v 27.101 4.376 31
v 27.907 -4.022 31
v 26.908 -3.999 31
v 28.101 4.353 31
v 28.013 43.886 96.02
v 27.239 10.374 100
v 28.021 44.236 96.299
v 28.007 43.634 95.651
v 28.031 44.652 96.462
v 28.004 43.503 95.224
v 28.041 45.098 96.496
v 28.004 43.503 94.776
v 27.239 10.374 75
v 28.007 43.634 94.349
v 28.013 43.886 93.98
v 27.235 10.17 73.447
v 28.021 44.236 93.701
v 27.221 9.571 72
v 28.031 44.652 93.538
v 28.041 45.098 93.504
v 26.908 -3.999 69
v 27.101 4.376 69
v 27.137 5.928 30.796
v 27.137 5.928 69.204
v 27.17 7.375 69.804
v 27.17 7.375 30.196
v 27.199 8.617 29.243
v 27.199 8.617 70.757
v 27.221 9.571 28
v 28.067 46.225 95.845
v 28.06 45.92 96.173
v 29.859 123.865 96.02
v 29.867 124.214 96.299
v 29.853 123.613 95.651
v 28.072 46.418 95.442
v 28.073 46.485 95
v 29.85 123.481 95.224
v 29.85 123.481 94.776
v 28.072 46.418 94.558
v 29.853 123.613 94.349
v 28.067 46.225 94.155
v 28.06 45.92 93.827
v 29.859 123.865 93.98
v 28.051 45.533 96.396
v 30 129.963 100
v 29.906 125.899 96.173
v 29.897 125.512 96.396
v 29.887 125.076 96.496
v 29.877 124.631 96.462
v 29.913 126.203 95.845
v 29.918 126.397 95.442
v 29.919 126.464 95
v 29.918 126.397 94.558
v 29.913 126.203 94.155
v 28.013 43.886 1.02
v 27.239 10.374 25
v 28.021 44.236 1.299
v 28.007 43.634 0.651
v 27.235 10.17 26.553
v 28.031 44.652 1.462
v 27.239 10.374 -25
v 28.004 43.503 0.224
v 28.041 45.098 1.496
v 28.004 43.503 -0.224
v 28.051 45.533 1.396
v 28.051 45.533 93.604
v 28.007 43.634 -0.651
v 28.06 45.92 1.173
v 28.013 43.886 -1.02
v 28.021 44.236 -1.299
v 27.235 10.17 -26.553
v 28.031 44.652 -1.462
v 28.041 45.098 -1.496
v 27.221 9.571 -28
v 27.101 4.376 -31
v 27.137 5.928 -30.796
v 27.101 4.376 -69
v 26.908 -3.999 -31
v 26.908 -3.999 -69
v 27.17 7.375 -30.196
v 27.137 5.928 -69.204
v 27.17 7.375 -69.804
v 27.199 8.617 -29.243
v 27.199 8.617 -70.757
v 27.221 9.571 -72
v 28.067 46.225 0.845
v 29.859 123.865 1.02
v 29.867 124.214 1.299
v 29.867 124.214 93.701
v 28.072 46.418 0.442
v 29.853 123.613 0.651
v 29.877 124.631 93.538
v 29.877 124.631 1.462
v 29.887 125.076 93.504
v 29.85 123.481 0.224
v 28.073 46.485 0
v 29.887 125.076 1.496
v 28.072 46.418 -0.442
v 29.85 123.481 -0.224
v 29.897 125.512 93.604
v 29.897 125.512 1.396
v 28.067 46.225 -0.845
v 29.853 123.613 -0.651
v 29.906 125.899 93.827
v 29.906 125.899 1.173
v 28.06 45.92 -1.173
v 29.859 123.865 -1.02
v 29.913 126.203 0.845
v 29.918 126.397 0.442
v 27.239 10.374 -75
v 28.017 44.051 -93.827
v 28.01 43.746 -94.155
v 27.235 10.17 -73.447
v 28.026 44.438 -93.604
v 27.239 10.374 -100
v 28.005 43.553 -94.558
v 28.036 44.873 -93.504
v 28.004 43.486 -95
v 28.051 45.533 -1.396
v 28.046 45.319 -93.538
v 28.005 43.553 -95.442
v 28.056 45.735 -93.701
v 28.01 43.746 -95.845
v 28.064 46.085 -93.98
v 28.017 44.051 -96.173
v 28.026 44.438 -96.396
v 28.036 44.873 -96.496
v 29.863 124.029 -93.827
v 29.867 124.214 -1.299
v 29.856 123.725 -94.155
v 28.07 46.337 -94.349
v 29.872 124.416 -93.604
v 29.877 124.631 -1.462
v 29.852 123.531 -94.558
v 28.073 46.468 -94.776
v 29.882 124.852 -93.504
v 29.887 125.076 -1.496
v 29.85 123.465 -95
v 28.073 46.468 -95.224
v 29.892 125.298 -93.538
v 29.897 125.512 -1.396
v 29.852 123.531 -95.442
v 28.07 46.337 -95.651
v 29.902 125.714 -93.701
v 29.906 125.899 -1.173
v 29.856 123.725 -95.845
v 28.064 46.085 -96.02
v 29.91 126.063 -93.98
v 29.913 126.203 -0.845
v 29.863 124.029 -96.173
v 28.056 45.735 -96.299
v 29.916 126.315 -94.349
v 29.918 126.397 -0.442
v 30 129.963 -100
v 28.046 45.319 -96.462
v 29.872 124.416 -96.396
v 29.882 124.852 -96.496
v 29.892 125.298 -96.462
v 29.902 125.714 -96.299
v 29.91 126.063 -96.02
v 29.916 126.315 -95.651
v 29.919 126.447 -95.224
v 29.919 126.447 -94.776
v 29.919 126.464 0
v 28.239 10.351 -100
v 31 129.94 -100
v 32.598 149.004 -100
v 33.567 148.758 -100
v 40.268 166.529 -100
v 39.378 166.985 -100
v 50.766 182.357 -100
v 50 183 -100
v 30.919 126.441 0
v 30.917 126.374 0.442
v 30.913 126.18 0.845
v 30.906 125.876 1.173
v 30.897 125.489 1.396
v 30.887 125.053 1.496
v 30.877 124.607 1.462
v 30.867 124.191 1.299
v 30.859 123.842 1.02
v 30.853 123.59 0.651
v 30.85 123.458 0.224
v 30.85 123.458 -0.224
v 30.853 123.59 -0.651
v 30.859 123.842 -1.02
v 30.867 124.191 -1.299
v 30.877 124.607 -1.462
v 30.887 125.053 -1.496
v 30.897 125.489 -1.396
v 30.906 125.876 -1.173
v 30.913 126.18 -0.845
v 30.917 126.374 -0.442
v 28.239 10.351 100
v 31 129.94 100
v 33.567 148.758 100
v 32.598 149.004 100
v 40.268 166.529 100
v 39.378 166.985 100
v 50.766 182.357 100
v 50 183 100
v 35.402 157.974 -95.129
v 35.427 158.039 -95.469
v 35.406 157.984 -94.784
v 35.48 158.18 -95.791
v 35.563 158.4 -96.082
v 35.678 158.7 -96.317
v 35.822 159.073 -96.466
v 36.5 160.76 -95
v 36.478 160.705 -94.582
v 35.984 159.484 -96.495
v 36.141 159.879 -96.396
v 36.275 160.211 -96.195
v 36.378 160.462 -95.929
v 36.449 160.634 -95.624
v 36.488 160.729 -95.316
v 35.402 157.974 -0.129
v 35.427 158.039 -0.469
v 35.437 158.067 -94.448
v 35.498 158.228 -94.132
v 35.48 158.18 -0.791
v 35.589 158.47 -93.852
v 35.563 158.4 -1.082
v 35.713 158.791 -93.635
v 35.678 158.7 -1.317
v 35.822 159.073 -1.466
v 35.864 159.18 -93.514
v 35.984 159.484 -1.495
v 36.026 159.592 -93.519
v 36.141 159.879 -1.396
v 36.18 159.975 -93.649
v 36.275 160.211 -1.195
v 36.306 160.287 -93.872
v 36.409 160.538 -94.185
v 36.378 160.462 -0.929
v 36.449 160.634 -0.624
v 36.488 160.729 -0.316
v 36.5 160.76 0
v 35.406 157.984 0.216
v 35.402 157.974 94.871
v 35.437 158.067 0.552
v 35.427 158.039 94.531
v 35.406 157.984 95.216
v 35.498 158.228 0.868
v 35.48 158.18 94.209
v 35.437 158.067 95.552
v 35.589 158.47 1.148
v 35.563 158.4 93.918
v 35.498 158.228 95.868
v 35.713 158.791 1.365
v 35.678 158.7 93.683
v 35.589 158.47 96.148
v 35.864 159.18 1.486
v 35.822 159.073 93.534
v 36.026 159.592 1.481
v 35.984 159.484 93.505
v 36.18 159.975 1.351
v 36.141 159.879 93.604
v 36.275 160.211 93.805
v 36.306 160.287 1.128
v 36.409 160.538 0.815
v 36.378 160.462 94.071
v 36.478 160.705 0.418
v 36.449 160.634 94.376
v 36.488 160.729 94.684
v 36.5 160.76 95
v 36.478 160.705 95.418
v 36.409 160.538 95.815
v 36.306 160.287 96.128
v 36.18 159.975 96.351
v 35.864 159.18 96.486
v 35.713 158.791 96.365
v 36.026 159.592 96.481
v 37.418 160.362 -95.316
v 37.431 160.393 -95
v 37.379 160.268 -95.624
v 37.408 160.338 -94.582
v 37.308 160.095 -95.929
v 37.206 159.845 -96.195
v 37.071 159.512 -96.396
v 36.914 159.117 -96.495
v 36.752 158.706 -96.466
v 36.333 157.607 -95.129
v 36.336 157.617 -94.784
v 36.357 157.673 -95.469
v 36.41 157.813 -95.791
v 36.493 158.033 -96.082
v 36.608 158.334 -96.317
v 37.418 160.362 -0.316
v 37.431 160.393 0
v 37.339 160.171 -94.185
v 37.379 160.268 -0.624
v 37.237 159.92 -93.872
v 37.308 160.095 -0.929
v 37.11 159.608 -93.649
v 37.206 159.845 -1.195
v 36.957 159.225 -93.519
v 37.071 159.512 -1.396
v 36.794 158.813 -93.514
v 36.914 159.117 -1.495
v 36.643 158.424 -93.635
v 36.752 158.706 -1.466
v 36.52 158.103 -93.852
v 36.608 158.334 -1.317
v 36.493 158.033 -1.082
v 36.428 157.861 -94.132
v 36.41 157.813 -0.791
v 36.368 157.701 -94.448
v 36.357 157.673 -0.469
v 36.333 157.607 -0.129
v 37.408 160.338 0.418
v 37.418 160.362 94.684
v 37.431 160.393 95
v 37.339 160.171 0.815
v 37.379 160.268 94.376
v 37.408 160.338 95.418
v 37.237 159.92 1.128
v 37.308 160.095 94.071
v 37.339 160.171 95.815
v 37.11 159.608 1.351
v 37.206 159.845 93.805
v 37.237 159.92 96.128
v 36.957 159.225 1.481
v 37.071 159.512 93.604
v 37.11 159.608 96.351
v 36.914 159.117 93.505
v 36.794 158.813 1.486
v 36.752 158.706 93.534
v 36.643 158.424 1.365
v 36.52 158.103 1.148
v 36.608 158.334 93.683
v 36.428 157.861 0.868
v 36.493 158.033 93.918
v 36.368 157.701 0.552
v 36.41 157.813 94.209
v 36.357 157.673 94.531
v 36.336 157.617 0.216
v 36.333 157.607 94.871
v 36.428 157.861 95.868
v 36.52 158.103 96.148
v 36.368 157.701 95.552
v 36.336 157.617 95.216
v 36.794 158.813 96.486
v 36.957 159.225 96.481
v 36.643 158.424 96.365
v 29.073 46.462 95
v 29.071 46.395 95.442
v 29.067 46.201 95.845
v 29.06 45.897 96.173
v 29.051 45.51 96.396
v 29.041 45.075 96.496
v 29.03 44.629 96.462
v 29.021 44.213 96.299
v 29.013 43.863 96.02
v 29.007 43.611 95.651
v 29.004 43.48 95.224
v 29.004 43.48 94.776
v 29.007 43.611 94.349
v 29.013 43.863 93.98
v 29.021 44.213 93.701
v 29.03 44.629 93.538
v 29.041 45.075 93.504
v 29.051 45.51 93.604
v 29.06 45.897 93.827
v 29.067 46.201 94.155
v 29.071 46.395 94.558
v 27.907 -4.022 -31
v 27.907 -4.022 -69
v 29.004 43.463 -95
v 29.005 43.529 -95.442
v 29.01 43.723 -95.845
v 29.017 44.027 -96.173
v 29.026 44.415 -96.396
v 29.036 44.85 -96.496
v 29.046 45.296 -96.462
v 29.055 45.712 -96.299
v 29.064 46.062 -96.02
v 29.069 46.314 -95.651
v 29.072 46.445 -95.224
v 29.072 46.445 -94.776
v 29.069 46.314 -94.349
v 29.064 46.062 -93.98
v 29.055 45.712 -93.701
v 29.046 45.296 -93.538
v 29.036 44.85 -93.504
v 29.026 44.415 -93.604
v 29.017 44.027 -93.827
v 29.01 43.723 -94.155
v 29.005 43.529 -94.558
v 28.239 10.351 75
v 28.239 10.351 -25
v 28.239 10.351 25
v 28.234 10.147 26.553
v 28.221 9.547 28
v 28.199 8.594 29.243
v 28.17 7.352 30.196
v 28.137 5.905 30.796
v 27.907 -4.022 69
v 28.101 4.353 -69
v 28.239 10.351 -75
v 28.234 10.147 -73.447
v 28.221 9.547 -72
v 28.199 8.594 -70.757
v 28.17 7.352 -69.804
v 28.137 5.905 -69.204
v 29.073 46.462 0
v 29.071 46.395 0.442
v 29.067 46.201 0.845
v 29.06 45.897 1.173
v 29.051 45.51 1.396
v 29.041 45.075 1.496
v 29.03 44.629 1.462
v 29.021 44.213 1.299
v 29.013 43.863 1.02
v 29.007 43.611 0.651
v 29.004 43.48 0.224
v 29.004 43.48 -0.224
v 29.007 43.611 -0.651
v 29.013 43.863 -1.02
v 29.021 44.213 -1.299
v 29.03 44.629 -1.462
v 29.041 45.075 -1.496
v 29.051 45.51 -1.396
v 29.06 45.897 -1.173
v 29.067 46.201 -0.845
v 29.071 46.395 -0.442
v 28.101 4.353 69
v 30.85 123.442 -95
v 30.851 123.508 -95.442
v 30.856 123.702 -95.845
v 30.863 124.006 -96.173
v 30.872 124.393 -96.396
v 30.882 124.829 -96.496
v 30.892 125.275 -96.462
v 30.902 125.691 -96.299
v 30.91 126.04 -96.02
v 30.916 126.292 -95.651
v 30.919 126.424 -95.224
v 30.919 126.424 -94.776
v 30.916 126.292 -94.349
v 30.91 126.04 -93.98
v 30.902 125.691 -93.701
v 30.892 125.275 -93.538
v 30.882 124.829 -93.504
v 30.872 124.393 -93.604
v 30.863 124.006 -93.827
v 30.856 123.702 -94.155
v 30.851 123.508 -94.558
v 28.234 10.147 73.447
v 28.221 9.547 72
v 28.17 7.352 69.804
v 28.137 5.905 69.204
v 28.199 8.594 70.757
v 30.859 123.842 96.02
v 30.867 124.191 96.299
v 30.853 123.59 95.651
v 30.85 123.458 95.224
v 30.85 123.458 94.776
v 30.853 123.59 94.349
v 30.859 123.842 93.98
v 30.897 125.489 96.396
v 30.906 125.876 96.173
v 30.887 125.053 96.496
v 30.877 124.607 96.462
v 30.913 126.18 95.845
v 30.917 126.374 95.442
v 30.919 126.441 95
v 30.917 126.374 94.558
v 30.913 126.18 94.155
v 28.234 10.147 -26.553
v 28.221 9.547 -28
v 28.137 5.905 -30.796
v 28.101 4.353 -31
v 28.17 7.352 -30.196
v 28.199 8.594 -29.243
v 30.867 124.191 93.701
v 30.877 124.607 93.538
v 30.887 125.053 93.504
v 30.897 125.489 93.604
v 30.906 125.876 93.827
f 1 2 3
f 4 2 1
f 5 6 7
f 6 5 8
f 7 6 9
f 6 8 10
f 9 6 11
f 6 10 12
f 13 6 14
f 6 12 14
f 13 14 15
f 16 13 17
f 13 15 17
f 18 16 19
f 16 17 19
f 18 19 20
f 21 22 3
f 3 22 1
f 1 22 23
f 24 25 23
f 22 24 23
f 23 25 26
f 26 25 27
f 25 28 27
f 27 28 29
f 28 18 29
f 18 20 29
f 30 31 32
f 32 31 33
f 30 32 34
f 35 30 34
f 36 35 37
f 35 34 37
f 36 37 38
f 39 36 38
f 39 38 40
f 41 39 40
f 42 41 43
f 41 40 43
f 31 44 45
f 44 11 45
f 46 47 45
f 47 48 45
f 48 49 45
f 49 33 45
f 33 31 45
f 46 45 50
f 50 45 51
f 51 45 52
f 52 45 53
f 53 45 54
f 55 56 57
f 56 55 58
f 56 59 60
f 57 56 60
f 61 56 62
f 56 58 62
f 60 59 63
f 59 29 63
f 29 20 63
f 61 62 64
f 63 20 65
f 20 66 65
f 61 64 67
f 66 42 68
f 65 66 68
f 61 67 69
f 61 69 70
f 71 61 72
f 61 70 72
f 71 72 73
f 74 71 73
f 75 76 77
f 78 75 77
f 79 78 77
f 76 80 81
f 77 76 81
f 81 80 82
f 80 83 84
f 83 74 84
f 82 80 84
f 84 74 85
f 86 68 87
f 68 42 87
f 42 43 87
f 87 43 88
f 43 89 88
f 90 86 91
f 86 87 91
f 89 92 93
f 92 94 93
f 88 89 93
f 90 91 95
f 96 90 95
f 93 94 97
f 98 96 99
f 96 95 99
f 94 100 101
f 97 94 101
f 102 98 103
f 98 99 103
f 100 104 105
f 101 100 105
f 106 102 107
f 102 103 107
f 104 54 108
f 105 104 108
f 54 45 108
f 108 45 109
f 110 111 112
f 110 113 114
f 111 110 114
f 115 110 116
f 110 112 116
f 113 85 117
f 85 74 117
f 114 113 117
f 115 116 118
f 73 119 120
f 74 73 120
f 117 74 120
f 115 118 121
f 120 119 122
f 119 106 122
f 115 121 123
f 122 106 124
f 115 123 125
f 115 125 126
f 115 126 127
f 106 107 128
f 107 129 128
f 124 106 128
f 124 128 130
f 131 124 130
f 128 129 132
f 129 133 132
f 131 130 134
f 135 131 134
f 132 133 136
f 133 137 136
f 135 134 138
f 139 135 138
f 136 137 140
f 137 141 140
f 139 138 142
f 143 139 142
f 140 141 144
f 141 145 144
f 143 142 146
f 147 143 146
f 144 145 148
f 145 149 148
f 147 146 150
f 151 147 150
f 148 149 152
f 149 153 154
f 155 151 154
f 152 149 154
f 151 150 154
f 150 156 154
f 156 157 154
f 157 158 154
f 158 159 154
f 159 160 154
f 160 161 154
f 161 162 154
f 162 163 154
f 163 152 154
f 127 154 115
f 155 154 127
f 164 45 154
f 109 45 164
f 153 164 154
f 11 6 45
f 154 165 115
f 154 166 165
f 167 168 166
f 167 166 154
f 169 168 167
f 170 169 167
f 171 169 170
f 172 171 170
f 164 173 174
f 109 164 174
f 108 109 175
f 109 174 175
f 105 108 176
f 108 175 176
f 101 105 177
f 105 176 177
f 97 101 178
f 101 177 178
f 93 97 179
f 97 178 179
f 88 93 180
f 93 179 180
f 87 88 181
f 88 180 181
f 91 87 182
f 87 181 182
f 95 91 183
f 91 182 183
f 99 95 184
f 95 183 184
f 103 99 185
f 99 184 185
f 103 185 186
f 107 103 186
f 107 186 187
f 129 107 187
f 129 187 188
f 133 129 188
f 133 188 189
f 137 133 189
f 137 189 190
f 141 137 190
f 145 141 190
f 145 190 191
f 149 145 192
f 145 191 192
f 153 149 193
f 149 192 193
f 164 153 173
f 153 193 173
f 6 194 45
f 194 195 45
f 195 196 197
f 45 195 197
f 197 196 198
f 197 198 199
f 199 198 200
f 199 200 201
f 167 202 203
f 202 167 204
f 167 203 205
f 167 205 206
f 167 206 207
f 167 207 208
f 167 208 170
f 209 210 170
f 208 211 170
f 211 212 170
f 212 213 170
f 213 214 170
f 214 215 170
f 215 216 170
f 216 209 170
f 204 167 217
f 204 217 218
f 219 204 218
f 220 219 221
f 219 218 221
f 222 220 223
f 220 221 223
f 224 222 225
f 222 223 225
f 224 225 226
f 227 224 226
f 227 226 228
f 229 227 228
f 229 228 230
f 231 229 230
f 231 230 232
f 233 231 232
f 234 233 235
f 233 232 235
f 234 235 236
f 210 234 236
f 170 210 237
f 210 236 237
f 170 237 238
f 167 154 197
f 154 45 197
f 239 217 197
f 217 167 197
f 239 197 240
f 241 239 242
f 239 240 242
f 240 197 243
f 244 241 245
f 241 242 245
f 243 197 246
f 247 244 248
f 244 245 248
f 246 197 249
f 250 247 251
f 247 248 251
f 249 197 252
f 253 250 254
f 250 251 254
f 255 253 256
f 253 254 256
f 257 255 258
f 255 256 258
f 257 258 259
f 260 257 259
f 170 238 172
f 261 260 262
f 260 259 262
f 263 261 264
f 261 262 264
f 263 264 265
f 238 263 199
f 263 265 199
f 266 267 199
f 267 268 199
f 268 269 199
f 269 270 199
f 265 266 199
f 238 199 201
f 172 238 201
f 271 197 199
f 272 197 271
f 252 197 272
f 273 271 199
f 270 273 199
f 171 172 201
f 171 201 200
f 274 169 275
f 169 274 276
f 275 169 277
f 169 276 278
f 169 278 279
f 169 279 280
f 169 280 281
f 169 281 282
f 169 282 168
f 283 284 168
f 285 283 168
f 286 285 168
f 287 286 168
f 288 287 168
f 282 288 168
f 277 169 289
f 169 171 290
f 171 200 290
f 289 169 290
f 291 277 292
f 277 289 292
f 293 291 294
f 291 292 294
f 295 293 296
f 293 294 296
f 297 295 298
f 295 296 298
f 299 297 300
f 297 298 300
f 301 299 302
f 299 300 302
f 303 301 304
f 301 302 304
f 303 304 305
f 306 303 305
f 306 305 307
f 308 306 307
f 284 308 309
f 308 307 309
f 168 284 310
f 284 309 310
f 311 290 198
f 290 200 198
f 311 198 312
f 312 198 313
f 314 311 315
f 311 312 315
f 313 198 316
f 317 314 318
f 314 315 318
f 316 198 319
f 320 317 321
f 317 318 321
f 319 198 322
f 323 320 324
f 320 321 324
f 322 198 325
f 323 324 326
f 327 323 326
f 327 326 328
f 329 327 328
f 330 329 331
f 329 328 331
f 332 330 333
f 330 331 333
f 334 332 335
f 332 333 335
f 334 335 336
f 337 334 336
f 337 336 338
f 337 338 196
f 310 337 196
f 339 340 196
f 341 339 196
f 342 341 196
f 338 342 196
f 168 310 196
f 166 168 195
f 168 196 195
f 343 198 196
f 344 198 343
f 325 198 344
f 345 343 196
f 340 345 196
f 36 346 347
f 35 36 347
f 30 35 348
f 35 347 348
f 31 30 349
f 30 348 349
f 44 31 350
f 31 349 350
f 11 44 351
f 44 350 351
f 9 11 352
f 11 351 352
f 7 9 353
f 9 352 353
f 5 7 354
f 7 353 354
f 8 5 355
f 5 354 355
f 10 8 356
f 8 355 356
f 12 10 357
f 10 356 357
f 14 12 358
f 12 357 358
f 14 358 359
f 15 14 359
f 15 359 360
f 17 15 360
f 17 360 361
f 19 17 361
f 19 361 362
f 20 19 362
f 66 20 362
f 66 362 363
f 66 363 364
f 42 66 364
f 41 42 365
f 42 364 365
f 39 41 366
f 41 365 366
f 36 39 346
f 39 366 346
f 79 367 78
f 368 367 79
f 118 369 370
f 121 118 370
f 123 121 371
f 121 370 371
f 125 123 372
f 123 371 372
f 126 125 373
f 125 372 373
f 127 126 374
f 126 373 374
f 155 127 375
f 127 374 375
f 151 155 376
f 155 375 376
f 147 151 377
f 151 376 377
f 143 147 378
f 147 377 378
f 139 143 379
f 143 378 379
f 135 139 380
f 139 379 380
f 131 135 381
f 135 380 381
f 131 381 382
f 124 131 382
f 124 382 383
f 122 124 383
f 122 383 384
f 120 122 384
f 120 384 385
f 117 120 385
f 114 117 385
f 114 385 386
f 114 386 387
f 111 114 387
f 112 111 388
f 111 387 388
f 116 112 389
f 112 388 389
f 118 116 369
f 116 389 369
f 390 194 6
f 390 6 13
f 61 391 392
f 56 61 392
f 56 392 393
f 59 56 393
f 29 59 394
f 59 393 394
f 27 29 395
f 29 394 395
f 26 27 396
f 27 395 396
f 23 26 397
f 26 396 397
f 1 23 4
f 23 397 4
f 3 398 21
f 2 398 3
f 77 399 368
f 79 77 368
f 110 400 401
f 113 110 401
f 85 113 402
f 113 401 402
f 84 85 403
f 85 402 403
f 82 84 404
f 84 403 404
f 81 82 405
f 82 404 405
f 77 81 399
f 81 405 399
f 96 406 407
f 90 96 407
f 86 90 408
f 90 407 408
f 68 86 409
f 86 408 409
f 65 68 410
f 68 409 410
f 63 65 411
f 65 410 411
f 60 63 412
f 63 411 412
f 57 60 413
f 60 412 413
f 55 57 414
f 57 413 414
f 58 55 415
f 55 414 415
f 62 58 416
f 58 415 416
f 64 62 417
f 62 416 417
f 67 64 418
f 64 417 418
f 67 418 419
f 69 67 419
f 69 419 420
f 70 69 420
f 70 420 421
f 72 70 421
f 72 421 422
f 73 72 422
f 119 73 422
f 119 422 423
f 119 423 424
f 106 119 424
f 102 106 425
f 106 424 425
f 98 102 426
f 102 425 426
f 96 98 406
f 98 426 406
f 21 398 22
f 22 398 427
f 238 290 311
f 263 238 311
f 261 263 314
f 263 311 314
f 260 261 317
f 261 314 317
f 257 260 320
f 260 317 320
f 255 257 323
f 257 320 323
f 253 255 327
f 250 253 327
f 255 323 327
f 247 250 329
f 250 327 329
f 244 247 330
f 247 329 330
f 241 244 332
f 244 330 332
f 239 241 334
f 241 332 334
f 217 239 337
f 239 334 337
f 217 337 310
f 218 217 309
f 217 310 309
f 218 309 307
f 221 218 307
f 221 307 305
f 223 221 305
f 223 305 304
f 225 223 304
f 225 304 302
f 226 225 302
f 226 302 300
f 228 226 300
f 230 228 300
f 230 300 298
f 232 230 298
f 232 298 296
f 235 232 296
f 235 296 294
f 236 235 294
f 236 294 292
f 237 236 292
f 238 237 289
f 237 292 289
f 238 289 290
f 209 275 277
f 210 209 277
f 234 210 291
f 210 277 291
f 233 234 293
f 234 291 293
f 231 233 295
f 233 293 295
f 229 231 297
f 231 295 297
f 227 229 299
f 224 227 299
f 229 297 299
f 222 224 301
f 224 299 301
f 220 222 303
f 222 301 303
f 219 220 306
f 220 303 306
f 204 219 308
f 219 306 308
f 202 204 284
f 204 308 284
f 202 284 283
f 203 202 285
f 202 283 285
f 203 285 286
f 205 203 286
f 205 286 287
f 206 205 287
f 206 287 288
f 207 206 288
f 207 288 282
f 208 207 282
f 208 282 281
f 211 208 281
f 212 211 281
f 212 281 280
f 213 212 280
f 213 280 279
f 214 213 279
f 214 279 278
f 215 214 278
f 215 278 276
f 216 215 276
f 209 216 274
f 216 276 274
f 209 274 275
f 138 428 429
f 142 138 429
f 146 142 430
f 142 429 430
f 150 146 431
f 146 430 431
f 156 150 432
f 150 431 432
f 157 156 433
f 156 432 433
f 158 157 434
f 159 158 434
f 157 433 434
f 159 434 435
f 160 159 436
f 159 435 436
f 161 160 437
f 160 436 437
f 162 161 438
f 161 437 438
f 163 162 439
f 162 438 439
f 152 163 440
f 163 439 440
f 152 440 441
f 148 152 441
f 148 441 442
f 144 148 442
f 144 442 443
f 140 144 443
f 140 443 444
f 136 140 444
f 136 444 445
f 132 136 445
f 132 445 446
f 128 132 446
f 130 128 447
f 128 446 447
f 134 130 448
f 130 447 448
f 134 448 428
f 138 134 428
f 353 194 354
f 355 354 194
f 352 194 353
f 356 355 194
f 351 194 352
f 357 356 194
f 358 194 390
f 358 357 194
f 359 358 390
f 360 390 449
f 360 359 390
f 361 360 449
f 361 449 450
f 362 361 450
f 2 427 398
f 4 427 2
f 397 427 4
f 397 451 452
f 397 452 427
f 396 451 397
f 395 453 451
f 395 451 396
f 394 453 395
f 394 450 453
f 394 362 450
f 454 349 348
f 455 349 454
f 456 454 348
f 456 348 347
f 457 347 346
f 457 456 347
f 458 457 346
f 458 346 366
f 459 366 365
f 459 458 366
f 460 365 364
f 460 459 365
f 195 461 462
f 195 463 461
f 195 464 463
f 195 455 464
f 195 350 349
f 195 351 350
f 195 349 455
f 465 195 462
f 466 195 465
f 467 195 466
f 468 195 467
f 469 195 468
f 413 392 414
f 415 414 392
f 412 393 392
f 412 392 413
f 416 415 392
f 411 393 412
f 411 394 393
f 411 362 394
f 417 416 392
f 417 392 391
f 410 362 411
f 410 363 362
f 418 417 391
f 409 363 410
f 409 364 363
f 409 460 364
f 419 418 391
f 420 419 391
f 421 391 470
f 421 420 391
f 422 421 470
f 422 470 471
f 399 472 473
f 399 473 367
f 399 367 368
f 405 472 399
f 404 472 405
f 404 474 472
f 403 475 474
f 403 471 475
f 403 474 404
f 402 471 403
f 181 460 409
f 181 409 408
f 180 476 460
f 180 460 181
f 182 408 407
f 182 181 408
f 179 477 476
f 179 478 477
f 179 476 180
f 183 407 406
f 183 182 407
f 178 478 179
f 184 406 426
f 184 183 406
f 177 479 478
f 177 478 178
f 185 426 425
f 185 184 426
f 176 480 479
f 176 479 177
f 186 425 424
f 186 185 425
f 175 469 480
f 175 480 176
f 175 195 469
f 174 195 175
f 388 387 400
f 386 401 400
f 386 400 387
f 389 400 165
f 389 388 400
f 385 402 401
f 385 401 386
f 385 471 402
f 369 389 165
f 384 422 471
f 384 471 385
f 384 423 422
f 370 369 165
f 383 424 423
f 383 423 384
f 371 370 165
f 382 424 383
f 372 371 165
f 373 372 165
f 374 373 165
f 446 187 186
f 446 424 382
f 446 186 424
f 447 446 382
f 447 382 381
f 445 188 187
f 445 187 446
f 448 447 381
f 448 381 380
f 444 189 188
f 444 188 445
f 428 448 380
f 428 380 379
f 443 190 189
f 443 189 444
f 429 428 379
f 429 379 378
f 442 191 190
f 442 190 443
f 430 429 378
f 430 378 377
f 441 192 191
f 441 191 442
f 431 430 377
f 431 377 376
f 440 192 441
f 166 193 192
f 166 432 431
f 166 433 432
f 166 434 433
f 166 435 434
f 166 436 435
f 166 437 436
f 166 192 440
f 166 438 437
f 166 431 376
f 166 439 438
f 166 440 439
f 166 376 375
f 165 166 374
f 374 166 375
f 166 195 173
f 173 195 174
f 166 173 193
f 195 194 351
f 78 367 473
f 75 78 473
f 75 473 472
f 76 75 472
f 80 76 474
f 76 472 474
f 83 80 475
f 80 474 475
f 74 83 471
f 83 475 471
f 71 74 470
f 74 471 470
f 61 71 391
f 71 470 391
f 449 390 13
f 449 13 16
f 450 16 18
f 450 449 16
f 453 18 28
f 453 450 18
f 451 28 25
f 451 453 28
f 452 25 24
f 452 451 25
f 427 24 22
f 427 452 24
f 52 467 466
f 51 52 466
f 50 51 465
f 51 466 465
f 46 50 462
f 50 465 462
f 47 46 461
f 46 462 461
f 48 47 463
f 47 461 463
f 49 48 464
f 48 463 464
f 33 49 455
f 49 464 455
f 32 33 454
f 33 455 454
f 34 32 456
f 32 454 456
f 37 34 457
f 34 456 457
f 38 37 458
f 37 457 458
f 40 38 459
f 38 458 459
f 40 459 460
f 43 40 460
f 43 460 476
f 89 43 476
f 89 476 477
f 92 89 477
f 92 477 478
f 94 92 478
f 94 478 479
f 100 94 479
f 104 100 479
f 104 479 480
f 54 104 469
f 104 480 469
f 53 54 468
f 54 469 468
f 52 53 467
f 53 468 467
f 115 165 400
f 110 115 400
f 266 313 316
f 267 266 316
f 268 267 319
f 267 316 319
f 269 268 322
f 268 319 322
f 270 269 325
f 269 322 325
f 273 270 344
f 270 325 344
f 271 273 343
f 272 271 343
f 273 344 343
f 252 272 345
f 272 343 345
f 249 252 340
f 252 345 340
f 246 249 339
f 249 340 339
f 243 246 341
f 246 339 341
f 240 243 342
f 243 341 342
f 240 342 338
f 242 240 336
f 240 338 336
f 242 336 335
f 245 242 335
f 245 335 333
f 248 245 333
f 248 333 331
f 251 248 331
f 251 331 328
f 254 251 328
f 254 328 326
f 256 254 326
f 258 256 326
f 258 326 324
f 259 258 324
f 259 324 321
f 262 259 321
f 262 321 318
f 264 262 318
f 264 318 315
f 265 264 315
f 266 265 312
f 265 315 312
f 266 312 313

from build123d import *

# Parameters (mm, degrees)
T_LE_DE_BASE_PLI_E1_DEPTH               = 100
ESQUISSE9_R                             = 1.5
ENL_V_MAT_EXTRU_1_DEPTH                 = 1
ESQUISSE6_W                             = 38
ESQUISSE6_H                             = 4
PATTE1_DEPTH                            = 1
DIAM_TRE_DU_PER_AGE_3_0_3_1_D           = 3
DIAM_TRE_DU_PER_AGE_3_0_3_1_ON_FACE_2_D = 3


# Sheet-metal steps are written as plain solids
with BuildPart() as part:
    # Esquisse1 → Tôle de base pliée1 (new, symmetric)
    with BuildSketch(Plane.XY):
        with BuildLine():
            Line((27, 0), (30, 129.962877268))
            ThreePointArc((30, 129.962877268), (35.481668982, 158.18527579), (50, 183))
            Line((50, 183), (50.766044443, 182.35721239))
            ThreePointArc((50.766044443, 182.35721239), (36.417352312, 157.832434881), (30.999733682, 129.939799901))
            Line((30.999733682, 129.939799901), (27.999733682, -0.023077367))
            Line((27.999733682, -0.023077367), (27, 0))
        make_face()
    extrude(amount=T_LE_DE_BASE_PLI_E1_DEPTH, both=True)

    # Esquisse9 → Enlèv. mat.-Extru.1 (cut)
    with BuildSketch(Plane(origin=(27.98535443, -0.646000343, 0), x_dir=(0, 0, -1), z_dir=(0.9997336820980194, -0.02307736724014006, 0))):
        with Locations(Location((-95, 45.620586844, 0), (0, 0, 90))):
            Circle(ESQUISSE9_R)
        with Locations(Location((-95, 125.620586844, 0), (0, 0, 90))):
            Circle(ESQUISSE9_R)
        with Locations(Location((0, 125.620586844, 0), (0, 0, 90))):
            Circle(ESQUISSE9_R)
        with Locations(Location((0, 45.620586844, 0), (0, 0, 90))):
            Circle(ESQUISSE9_R)
        with Locations(Location((95, 45.620586844, 0), (0, 0, 270))):
            Circle(ESQUISSE9_R)
        with Locations(Location((95, 125.620586844, 0), (0, 0, 270))):
            Circle(ESQUISSE9_R)
        with BuildLine():
            Line((-69, 5), (-69, 0.623088915))
            Line((-69, 0.623088915), (-100, 0.623088915))
            Line((-100, 0.623088915), (-100, 11))
            Line((-100, 11), (-75, 11))
            ThreePointArc((-75, 11), (-70.757359313, 9.242640687), (-69, 5))
        make_face()
        with BuildLine():
            Line((25, 11), (-25, 11))
            ThreePointArc((-25, 11), (-29.242640687, 9.242640687), (-31, 5))
            Line((-31, 5), (-31, 0.623088915))
            Line((-31, 0.623088915), (31, 0.623088915))
            Line((31, 0.623088915), (31, 5))
            ThreePointArc((31, 5), (29.242640687, 9.242640687), (25, 11))
        make_face()
        with BuildLine():
            Line((100, 11), (75, 11))
            ThreePointArc((75, 11), (70.757359313, 9.242640687), (69, 5))
            Line((69, 5), (69, 0.623088915))
            Line((69, 0.623088915), (100, 0.623088915))
            Line((100, 0.623088915), (100, 11))
        make_face()
    extrude(amount=-ENL_V_MAT_EXTRU_1_DEPTH, mode=Mode.SUBTRACT)

    # Esquisse6 → Patte1 (add)
    with BuildSketch(Plane(origin=(27.98535443, -0.646000343, 0), x_dir=(0, 0, -1), z_dir=(0.9997336820980194, -0.02307736724014006, 0))):
        with Locations((-50, -1.376911085)):
            Rectangle(ESQUISSE6_W, ESQUISSE6_H)
        with Locations((50, -1.376911085)):
            Rectangle(ESQUISSE6_W, ESQUISSE6_H)
    extrude(amount=-PATTE1_DEPTH)

    # Diamètre du perçage Ø3.0 (3)1 (through all)
    with Locations(Plane(origin=(35.938212122, 159.369298961, -95), x_dir=(-0.366675582569, -0.930348868515, 0), z_dir=(-0.930348868515, 0.366675582569, 0))):
        with Locations((0, 0)):
            Hole(DIAM_TRE_DU_PER_AGE_3_0_3_1_D / 2)

    # Diamètre du perçage Ø3.0 (3)1 on face 2 (through all)
    with Locations(Plane(origin=(35.938212122, 159.369298961, 0), x_dir=(-0.366675899022, -0.930348743793, 0), z_dir=(-0.930348743793, 0.366675899022, 0))):
        with Locations((0, 0), (0, 95)):
            Hole(DIAM_TRE_DU_PER_AGE_3_0_3_1_ON_FACE_2_D / 2)


solid = part.part
